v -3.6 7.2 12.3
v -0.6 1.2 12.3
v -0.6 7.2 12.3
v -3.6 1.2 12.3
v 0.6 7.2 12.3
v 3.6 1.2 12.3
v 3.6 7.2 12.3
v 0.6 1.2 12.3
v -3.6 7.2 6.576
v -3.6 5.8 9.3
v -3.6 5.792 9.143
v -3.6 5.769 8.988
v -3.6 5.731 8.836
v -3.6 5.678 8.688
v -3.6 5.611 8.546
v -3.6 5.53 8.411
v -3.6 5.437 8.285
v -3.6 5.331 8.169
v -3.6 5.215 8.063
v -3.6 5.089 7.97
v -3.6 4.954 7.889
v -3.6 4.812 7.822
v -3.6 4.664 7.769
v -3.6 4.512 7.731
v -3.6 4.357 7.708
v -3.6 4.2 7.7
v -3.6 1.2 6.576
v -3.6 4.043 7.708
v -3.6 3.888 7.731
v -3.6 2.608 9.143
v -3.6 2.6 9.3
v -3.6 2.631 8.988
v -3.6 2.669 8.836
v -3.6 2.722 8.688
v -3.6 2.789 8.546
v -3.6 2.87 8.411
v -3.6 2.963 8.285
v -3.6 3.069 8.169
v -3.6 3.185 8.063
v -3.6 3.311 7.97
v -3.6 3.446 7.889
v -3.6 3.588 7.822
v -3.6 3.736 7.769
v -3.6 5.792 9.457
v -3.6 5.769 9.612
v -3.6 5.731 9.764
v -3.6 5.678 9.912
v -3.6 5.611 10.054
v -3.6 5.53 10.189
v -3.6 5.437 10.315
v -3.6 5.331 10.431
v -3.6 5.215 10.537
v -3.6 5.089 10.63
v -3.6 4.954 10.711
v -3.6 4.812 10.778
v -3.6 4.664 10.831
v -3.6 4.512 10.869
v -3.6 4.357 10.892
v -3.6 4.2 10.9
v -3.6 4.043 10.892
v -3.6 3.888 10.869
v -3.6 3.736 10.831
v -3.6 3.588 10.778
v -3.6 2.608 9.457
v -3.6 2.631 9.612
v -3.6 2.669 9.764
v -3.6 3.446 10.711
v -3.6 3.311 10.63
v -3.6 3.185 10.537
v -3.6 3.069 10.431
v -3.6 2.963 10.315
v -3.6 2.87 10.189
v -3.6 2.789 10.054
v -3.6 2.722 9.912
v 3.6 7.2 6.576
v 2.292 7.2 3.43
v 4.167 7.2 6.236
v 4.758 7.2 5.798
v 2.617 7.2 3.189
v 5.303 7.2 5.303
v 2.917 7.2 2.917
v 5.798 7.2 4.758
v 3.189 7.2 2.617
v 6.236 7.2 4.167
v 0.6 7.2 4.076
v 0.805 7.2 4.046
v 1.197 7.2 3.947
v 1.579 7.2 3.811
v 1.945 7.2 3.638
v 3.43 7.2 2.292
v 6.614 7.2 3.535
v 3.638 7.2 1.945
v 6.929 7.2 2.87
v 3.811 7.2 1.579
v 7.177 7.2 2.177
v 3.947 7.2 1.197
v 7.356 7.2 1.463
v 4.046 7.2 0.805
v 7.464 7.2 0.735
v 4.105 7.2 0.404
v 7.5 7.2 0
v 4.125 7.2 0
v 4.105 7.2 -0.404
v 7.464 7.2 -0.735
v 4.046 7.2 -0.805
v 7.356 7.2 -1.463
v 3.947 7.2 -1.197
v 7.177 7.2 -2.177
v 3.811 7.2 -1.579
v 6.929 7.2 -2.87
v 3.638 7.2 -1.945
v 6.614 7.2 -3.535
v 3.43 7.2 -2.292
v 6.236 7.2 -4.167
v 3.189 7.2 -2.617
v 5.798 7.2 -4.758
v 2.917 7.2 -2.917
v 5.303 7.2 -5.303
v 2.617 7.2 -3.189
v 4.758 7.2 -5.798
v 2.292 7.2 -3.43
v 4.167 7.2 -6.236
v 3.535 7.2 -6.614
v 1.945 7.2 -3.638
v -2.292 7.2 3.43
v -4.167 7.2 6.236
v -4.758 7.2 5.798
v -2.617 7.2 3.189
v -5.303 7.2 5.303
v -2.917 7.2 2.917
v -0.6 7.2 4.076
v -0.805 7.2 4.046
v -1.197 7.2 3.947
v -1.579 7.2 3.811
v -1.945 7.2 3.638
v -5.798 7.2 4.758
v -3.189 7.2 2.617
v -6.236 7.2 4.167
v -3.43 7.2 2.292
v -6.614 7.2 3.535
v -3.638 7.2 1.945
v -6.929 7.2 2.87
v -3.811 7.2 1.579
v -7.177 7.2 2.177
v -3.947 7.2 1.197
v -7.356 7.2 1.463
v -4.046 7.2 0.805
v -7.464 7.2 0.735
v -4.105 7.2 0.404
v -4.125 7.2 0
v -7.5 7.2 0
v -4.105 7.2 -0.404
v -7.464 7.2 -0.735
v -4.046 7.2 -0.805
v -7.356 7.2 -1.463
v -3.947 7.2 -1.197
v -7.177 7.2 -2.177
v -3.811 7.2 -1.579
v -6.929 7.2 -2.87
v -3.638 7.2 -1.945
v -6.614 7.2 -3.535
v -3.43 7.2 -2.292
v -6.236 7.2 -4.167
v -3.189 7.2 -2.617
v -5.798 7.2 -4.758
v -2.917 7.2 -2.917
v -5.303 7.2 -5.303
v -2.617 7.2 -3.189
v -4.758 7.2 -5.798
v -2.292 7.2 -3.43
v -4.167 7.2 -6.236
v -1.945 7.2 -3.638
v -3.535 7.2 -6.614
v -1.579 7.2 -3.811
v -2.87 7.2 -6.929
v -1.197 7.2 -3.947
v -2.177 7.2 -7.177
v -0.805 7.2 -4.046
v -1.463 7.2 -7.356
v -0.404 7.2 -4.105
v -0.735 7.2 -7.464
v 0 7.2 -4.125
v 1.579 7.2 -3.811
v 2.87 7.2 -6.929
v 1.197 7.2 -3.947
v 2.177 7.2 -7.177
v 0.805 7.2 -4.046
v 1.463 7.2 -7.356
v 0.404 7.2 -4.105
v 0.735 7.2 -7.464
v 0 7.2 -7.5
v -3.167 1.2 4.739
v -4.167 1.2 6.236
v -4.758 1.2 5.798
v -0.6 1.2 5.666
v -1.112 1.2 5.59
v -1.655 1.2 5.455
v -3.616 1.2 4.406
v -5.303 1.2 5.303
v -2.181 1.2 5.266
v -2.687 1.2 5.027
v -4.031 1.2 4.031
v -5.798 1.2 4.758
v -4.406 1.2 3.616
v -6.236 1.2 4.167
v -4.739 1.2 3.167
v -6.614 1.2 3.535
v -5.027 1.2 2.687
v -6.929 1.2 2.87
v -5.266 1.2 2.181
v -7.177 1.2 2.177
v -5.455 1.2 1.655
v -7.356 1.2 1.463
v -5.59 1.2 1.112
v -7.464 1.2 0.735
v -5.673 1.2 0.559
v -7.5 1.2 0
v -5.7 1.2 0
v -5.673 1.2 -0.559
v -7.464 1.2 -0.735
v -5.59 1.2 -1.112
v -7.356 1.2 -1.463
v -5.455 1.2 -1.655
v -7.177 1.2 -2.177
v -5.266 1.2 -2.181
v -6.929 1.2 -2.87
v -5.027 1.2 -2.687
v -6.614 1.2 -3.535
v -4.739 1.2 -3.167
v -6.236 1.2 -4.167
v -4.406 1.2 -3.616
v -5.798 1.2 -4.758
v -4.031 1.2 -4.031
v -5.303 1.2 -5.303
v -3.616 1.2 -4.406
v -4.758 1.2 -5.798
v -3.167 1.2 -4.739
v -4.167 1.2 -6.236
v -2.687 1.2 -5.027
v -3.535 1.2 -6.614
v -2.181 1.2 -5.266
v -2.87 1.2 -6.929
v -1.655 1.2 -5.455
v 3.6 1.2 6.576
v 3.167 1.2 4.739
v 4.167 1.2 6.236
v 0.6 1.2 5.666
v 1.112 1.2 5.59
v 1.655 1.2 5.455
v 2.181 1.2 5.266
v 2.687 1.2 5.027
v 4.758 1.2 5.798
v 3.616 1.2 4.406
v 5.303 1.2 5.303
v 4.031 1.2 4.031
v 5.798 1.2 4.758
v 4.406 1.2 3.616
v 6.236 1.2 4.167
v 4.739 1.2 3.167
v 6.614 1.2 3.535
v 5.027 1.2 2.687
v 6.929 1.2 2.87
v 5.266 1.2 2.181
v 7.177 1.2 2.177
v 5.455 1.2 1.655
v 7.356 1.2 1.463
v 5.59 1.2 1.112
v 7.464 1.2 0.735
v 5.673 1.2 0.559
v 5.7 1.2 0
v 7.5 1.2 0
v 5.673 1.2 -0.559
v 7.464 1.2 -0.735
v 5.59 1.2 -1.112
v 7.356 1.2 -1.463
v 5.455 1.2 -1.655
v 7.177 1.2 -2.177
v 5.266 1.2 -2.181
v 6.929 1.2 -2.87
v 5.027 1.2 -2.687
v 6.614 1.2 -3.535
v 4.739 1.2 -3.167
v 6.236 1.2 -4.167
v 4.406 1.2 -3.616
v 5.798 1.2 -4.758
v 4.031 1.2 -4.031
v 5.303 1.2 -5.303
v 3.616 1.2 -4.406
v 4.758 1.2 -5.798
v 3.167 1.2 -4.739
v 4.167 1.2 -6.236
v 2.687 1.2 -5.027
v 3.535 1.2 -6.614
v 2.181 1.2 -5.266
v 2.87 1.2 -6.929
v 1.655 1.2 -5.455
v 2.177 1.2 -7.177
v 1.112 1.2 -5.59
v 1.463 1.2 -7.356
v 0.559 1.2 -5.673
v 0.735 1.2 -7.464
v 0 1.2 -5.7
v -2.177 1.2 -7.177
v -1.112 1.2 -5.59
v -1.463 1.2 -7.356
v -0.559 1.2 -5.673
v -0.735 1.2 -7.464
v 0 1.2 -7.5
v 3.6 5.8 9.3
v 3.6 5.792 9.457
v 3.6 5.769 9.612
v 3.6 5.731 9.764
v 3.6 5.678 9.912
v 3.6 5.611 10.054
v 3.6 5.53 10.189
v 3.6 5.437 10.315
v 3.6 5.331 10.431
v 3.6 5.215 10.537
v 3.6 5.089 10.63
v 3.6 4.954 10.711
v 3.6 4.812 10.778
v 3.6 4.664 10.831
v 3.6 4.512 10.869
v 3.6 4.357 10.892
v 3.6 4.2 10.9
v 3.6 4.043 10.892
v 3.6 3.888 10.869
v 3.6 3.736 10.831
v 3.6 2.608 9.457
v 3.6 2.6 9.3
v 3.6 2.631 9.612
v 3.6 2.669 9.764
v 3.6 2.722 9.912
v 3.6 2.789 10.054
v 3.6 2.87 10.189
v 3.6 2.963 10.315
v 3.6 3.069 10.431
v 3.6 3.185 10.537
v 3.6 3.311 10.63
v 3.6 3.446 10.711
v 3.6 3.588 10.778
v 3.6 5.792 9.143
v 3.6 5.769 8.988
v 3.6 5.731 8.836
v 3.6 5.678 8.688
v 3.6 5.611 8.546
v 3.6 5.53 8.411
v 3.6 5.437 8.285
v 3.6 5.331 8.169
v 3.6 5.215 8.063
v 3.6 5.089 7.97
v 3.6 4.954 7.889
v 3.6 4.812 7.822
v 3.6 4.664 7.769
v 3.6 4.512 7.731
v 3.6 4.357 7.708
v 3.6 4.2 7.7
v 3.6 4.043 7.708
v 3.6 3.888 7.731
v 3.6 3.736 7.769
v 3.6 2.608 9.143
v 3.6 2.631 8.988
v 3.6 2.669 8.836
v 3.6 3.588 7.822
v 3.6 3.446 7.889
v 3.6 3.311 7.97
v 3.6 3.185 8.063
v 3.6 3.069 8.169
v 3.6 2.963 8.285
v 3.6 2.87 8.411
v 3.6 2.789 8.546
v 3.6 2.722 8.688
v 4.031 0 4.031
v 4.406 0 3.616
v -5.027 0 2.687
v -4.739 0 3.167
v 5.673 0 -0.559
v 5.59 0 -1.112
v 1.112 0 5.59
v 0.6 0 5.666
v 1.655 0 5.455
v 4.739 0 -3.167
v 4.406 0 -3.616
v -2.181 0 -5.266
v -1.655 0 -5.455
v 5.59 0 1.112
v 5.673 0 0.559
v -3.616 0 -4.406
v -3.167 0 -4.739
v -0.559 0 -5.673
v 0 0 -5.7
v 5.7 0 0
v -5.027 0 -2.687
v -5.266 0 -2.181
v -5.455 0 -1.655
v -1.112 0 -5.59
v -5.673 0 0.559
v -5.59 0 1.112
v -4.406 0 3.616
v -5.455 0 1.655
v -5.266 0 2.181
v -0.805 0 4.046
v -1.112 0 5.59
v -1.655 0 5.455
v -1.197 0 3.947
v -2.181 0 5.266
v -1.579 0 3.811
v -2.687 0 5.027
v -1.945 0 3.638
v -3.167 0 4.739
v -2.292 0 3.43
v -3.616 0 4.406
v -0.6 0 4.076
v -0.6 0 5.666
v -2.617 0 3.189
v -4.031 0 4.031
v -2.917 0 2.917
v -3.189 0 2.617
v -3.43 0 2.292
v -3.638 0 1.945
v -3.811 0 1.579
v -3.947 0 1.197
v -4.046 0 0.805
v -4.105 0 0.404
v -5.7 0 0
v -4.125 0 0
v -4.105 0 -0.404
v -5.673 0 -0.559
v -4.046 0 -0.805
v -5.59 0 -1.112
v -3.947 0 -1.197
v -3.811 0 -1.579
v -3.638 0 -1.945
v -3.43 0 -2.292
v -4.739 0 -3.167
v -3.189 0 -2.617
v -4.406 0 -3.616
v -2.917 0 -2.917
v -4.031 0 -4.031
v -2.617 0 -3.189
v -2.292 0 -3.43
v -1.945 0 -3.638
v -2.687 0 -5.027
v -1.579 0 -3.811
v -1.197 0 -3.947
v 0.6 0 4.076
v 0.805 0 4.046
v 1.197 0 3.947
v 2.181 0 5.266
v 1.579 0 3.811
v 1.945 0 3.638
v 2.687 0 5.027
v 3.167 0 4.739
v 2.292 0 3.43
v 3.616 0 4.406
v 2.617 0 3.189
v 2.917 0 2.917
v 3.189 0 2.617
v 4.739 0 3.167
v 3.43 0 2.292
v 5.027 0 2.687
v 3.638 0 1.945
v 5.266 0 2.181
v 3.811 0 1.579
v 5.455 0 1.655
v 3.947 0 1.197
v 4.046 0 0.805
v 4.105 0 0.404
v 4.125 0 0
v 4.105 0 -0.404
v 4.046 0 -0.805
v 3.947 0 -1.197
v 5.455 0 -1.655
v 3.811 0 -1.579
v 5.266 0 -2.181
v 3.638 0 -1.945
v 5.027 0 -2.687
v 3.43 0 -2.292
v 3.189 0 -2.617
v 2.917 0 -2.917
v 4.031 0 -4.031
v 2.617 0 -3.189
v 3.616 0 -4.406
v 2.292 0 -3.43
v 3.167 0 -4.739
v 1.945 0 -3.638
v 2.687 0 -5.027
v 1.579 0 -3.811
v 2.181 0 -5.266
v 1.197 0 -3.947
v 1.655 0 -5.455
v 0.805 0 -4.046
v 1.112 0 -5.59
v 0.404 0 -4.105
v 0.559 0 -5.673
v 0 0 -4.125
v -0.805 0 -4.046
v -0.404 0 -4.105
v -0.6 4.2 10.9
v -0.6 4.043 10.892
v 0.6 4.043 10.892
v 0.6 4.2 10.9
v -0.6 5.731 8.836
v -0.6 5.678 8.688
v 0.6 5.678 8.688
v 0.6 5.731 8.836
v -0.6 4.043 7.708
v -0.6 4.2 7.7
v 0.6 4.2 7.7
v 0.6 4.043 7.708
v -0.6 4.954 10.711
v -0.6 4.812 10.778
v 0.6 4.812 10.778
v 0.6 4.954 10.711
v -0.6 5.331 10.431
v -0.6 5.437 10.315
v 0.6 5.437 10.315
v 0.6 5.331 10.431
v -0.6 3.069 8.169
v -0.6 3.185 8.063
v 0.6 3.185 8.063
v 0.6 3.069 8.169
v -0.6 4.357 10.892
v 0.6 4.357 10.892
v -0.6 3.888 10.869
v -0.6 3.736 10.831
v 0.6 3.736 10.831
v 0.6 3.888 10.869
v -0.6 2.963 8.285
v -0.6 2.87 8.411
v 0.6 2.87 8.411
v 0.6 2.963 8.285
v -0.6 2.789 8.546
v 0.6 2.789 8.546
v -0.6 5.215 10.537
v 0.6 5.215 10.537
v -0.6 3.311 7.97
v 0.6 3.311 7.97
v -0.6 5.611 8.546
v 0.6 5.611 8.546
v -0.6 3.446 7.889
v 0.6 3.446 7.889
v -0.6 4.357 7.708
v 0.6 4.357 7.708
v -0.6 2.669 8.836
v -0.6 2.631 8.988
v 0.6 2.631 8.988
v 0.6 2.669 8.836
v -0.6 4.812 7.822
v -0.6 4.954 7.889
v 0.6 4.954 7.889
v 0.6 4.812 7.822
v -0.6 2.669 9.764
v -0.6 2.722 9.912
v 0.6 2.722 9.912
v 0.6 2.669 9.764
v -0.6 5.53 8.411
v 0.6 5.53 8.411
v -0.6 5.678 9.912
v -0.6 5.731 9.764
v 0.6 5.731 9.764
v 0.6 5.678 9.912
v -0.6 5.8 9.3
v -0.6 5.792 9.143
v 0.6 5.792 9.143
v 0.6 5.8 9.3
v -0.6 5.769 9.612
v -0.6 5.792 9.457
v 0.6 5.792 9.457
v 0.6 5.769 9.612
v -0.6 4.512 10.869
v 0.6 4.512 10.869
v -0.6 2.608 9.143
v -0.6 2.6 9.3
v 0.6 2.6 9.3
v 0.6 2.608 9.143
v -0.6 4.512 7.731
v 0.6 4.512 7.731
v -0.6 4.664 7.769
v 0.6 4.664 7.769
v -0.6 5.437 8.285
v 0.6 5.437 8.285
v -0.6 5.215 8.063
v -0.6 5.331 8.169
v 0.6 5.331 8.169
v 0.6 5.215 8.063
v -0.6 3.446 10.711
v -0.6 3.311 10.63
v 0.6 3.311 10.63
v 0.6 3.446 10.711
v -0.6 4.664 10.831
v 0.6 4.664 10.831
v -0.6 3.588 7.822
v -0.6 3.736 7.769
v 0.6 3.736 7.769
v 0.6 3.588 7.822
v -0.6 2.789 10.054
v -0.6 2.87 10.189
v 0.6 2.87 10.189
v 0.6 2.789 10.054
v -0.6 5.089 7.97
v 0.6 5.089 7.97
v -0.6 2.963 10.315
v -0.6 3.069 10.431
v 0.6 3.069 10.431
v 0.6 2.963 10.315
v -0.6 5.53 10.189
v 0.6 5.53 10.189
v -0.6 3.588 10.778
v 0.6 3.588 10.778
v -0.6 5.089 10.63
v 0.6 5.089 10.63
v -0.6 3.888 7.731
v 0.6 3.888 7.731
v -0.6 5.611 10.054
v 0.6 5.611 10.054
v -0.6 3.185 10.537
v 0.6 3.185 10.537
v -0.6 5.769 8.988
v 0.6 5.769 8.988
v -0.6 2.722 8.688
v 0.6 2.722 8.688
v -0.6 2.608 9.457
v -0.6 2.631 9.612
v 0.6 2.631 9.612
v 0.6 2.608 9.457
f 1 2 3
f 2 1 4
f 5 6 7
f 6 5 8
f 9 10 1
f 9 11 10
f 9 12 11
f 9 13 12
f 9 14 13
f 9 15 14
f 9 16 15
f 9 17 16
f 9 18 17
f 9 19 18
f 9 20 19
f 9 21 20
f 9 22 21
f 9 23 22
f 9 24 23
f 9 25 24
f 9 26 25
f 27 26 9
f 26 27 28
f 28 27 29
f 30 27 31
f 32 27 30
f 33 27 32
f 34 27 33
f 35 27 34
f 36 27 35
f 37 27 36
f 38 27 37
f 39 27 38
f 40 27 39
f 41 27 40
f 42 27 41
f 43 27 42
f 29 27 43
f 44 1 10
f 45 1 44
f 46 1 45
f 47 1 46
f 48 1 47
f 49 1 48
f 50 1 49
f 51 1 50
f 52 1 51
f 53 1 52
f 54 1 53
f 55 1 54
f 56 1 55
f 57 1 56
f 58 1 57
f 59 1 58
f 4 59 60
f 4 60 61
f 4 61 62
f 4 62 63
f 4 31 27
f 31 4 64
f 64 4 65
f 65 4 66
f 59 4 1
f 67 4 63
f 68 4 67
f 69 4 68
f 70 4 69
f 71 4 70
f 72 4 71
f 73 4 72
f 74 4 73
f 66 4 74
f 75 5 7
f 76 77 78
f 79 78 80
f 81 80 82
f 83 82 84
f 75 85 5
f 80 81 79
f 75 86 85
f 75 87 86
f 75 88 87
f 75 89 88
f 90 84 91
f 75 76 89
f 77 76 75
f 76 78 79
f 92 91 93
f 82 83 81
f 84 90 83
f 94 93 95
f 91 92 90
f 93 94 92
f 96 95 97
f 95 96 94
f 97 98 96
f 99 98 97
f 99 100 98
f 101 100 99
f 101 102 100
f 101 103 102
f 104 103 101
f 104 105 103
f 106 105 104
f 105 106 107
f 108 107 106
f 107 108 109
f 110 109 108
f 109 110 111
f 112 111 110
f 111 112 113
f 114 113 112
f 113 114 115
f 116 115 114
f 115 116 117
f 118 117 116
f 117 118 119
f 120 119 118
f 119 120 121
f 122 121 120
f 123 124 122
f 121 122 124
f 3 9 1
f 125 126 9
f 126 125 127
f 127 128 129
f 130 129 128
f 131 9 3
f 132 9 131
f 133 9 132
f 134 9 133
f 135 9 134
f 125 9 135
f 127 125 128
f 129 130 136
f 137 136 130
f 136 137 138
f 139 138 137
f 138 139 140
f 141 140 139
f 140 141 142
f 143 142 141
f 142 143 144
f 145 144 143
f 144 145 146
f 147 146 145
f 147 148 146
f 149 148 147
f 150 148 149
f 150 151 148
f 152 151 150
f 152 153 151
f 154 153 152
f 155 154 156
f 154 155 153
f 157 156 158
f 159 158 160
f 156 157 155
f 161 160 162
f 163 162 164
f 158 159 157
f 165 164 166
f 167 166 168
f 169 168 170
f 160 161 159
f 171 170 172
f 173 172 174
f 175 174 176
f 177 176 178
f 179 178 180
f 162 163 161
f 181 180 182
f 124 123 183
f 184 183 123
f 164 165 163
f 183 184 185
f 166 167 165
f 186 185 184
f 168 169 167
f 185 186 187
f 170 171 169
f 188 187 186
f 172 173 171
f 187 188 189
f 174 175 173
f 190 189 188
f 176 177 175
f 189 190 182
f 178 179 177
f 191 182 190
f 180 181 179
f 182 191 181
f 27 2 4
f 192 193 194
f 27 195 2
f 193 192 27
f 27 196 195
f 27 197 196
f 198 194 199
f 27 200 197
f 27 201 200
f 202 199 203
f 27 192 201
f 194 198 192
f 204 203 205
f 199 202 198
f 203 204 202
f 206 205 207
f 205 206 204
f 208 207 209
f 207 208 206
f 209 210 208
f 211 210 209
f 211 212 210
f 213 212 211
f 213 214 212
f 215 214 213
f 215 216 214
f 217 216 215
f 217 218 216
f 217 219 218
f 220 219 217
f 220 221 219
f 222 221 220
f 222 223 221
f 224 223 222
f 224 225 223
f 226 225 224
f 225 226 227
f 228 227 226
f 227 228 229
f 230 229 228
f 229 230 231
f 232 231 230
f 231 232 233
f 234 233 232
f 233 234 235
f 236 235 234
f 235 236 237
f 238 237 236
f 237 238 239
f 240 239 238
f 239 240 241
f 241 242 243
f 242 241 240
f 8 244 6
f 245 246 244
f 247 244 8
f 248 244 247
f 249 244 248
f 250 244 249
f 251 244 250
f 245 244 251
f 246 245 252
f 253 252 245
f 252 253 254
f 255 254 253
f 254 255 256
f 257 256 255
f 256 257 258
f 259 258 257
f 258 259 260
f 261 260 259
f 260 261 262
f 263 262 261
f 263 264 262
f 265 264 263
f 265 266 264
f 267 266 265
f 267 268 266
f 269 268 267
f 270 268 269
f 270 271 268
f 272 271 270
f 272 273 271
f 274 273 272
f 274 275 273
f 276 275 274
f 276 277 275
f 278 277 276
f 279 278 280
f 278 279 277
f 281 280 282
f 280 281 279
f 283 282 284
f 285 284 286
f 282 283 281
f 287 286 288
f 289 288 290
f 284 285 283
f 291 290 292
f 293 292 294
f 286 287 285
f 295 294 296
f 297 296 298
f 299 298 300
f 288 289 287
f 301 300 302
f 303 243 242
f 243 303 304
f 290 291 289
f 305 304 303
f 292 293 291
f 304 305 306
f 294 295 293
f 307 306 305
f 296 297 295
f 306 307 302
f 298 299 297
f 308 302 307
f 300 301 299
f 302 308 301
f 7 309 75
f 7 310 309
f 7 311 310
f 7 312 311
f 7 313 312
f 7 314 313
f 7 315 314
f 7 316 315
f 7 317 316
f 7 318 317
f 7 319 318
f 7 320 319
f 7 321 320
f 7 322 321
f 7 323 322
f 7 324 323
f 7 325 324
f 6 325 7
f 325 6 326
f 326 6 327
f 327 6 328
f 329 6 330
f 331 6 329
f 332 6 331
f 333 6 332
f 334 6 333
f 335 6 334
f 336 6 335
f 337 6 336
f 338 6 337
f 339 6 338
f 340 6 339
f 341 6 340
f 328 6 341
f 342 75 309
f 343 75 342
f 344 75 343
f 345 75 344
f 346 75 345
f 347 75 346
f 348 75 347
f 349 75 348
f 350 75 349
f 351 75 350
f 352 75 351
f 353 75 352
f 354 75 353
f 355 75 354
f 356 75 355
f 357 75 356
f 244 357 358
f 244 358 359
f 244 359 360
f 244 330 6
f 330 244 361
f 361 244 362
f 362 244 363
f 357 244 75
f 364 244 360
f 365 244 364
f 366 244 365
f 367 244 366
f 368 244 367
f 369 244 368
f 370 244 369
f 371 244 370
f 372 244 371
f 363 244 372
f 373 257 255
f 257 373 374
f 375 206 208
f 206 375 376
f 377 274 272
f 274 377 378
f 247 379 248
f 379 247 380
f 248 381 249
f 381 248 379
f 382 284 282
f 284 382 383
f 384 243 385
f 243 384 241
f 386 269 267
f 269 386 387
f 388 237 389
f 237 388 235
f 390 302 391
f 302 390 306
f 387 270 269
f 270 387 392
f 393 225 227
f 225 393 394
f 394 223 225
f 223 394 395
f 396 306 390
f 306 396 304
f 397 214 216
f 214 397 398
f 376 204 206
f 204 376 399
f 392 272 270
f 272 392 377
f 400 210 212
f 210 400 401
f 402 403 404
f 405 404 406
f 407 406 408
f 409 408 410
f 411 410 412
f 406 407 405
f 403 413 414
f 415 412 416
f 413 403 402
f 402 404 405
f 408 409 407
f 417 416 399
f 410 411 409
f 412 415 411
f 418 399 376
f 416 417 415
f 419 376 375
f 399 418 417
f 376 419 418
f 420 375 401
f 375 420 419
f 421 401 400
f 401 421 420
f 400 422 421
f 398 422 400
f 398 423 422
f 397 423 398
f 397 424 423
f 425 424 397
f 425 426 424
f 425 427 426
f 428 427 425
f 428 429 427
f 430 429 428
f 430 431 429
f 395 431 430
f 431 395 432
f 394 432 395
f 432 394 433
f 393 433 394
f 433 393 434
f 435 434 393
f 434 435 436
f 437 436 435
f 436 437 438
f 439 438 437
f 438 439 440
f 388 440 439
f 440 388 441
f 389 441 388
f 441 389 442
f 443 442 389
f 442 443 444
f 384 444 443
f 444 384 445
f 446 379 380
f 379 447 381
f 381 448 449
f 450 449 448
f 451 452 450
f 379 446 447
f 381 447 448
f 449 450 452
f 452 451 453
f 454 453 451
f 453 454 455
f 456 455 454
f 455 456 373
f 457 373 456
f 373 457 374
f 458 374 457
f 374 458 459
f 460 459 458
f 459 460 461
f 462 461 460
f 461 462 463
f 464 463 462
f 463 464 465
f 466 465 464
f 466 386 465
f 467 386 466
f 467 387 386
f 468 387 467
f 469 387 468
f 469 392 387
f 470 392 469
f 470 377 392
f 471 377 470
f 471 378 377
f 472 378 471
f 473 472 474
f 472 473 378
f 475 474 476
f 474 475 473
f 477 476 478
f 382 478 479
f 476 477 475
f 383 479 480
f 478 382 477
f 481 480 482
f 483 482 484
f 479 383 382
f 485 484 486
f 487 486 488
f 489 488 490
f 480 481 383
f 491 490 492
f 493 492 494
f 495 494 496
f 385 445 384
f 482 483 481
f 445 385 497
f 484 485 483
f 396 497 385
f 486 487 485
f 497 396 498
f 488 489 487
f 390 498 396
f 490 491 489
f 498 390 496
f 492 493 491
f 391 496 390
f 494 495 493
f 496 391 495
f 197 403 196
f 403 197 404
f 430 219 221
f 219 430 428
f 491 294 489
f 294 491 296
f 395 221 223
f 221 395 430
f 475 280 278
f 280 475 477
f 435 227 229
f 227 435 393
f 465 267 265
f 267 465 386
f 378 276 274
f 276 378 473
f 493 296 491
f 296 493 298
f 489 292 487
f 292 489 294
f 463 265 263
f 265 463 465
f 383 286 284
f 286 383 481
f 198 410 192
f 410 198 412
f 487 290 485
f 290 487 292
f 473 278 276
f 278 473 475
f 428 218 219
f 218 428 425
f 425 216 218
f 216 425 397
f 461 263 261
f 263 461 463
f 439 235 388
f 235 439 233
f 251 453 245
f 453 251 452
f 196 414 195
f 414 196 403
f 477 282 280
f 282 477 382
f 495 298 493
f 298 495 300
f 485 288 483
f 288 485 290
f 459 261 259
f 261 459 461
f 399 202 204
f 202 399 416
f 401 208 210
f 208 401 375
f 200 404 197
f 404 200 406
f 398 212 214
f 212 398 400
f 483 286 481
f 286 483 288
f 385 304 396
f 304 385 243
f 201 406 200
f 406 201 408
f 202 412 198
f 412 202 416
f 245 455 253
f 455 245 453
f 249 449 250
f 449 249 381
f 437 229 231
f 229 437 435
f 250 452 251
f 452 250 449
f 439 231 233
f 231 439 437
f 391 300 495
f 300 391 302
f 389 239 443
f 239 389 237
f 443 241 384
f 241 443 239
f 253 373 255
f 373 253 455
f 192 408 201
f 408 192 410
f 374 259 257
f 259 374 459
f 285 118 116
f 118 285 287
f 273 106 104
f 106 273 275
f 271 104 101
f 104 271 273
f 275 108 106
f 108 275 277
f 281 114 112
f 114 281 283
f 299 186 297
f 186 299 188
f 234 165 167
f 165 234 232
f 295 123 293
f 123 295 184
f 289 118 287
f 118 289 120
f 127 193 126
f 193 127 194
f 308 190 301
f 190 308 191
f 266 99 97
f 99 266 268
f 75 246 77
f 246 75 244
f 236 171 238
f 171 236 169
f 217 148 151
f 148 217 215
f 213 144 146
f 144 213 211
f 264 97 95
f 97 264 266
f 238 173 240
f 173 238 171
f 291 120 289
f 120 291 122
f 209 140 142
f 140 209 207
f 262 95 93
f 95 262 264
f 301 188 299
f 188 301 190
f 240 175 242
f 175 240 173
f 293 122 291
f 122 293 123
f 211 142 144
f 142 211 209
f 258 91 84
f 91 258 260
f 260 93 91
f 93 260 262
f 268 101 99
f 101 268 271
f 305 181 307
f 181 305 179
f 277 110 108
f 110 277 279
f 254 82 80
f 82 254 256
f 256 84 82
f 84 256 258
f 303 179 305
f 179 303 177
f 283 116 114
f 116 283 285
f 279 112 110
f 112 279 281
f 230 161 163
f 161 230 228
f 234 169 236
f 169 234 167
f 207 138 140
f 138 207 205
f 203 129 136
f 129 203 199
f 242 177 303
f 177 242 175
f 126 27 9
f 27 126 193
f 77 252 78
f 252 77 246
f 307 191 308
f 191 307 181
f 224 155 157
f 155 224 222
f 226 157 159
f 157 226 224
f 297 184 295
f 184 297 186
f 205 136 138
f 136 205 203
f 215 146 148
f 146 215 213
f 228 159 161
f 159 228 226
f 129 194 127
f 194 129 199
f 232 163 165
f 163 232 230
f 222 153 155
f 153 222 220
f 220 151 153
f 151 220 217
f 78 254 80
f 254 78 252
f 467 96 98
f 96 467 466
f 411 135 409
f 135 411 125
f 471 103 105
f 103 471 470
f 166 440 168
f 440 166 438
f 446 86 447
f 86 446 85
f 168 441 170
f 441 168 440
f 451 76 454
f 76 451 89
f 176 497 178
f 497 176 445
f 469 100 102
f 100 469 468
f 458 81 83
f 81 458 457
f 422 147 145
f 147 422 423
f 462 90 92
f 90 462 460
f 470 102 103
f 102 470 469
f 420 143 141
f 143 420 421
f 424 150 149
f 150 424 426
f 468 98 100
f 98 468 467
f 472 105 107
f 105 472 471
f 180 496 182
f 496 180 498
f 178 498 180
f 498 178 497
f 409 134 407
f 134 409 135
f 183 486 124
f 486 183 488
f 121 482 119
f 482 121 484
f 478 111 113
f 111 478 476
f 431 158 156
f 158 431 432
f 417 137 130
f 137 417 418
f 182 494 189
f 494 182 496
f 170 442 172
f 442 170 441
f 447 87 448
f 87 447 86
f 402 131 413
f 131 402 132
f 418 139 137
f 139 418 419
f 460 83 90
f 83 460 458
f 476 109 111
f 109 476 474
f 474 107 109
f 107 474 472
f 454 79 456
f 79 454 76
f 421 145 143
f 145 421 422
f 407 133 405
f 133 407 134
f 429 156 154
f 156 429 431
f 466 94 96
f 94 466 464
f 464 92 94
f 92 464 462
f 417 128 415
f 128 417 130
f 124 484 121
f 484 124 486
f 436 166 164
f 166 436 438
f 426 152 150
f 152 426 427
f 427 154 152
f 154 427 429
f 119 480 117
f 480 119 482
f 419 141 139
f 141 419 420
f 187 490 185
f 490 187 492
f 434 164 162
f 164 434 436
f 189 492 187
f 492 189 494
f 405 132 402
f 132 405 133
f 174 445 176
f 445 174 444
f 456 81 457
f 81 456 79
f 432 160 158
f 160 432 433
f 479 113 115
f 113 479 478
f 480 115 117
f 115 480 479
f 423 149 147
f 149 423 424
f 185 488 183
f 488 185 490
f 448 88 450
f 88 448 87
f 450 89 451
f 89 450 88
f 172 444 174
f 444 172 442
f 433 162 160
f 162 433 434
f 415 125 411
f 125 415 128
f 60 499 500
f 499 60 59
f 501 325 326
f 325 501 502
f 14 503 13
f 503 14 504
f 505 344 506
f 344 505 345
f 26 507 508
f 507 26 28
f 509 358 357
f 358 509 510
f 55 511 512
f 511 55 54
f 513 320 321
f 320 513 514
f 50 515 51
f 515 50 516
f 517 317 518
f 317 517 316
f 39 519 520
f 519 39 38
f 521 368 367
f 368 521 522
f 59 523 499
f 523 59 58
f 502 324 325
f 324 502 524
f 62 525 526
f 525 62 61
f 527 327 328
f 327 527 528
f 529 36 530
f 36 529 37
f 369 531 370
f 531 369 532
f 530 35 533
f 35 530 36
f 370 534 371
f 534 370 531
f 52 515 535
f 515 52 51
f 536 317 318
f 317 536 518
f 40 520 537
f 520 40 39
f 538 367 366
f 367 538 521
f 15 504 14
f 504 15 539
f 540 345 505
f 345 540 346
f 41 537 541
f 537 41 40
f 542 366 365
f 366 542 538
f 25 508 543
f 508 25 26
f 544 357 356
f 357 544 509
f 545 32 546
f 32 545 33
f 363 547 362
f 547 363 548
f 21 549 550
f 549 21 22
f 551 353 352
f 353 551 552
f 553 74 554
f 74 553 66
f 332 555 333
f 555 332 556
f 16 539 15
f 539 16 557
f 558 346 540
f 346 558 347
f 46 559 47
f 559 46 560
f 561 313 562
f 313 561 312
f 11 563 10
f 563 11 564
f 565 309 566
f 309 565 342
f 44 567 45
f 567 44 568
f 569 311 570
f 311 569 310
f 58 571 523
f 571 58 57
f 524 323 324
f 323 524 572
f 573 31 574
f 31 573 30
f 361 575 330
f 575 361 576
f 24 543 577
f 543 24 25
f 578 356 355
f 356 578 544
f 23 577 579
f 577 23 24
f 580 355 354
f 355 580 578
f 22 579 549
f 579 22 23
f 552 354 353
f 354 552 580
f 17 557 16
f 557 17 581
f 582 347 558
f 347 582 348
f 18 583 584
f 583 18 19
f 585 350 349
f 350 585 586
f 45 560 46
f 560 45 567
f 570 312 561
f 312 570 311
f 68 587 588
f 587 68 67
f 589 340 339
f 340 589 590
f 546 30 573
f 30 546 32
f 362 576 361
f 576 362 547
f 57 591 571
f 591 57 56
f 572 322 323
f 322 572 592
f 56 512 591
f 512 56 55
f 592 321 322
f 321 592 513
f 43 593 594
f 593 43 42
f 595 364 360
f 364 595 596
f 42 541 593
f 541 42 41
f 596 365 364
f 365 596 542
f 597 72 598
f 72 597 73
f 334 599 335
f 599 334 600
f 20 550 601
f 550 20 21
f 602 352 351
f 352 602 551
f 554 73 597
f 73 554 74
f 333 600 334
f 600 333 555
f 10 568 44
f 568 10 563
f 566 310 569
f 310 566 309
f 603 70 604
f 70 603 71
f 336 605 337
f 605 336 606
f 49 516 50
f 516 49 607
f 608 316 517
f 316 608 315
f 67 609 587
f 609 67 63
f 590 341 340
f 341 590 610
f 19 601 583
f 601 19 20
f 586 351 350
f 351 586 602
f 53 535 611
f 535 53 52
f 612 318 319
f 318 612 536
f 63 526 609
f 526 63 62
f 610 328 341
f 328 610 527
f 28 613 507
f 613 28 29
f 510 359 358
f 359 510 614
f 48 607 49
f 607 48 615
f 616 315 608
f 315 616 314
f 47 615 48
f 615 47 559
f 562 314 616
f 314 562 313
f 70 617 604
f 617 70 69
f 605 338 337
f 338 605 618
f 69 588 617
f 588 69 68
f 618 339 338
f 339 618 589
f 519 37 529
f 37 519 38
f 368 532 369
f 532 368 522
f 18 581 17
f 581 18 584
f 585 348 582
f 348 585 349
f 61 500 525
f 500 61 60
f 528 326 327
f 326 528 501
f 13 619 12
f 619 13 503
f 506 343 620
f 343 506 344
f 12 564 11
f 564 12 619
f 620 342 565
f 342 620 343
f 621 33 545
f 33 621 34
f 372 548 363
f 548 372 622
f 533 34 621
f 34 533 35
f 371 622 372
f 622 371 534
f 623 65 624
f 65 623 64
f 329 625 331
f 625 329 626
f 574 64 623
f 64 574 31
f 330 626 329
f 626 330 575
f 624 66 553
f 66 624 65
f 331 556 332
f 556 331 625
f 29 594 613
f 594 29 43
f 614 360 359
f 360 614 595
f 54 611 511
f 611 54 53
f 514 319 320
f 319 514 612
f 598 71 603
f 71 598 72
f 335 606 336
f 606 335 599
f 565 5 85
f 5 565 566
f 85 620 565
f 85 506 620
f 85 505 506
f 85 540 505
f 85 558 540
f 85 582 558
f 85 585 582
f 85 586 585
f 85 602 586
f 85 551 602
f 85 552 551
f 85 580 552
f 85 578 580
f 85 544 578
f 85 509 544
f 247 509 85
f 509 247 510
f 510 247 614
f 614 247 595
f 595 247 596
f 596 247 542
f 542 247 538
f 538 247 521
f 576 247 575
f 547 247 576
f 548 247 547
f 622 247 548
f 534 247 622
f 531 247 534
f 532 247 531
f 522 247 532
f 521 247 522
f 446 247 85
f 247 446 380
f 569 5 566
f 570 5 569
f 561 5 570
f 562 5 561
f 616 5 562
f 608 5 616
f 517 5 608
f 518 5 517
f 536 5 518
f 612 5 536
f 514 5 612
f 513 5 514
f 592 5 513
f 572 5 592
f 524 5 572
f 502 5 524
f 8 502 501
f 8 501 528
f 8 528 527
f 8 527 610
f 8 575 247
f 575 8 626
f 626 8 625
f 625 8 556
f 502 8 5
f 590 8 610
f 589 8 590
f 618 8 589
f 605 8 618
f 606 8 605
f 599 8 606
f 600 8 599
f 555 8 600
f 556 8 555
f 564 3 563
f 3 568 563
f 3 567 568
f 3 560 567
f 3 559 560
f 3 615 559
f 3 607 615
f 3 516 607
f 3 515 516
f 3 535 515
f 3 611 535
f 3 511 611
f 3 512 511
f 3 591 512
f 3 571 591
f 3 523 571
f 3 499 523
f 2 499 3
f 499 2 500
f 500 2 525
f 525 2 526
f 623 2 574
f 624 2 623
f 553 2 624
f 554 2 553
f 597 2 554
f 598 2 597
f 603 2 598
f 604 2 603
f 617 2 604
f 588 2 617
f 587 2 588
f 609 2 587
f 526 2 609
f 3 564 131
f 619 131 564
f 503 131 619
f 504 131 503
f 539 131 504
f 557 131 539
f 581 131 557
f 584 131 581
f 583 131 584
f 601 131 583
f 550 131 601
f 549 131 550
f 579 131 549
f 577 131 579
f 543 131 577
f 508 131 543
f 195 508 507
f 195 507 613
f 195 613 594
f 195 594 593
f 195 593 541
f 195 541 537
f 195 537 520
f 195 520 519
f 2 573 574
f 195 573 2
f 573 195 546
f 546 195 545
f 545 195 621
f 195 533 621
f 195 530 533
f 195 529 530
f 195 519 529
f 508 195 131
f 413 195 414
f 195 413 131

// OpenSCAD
// Standalone lock collar part.
// Edit shared dimensions in frame_v3.scad so the assembly and this part stay linked.

part_mode = "lock_collar";
collar_dir = 1;            // flip to -1 only for mirrored preview
print_export = true;       // use high quality $fn for STL export

include <frame_v3.scad>
